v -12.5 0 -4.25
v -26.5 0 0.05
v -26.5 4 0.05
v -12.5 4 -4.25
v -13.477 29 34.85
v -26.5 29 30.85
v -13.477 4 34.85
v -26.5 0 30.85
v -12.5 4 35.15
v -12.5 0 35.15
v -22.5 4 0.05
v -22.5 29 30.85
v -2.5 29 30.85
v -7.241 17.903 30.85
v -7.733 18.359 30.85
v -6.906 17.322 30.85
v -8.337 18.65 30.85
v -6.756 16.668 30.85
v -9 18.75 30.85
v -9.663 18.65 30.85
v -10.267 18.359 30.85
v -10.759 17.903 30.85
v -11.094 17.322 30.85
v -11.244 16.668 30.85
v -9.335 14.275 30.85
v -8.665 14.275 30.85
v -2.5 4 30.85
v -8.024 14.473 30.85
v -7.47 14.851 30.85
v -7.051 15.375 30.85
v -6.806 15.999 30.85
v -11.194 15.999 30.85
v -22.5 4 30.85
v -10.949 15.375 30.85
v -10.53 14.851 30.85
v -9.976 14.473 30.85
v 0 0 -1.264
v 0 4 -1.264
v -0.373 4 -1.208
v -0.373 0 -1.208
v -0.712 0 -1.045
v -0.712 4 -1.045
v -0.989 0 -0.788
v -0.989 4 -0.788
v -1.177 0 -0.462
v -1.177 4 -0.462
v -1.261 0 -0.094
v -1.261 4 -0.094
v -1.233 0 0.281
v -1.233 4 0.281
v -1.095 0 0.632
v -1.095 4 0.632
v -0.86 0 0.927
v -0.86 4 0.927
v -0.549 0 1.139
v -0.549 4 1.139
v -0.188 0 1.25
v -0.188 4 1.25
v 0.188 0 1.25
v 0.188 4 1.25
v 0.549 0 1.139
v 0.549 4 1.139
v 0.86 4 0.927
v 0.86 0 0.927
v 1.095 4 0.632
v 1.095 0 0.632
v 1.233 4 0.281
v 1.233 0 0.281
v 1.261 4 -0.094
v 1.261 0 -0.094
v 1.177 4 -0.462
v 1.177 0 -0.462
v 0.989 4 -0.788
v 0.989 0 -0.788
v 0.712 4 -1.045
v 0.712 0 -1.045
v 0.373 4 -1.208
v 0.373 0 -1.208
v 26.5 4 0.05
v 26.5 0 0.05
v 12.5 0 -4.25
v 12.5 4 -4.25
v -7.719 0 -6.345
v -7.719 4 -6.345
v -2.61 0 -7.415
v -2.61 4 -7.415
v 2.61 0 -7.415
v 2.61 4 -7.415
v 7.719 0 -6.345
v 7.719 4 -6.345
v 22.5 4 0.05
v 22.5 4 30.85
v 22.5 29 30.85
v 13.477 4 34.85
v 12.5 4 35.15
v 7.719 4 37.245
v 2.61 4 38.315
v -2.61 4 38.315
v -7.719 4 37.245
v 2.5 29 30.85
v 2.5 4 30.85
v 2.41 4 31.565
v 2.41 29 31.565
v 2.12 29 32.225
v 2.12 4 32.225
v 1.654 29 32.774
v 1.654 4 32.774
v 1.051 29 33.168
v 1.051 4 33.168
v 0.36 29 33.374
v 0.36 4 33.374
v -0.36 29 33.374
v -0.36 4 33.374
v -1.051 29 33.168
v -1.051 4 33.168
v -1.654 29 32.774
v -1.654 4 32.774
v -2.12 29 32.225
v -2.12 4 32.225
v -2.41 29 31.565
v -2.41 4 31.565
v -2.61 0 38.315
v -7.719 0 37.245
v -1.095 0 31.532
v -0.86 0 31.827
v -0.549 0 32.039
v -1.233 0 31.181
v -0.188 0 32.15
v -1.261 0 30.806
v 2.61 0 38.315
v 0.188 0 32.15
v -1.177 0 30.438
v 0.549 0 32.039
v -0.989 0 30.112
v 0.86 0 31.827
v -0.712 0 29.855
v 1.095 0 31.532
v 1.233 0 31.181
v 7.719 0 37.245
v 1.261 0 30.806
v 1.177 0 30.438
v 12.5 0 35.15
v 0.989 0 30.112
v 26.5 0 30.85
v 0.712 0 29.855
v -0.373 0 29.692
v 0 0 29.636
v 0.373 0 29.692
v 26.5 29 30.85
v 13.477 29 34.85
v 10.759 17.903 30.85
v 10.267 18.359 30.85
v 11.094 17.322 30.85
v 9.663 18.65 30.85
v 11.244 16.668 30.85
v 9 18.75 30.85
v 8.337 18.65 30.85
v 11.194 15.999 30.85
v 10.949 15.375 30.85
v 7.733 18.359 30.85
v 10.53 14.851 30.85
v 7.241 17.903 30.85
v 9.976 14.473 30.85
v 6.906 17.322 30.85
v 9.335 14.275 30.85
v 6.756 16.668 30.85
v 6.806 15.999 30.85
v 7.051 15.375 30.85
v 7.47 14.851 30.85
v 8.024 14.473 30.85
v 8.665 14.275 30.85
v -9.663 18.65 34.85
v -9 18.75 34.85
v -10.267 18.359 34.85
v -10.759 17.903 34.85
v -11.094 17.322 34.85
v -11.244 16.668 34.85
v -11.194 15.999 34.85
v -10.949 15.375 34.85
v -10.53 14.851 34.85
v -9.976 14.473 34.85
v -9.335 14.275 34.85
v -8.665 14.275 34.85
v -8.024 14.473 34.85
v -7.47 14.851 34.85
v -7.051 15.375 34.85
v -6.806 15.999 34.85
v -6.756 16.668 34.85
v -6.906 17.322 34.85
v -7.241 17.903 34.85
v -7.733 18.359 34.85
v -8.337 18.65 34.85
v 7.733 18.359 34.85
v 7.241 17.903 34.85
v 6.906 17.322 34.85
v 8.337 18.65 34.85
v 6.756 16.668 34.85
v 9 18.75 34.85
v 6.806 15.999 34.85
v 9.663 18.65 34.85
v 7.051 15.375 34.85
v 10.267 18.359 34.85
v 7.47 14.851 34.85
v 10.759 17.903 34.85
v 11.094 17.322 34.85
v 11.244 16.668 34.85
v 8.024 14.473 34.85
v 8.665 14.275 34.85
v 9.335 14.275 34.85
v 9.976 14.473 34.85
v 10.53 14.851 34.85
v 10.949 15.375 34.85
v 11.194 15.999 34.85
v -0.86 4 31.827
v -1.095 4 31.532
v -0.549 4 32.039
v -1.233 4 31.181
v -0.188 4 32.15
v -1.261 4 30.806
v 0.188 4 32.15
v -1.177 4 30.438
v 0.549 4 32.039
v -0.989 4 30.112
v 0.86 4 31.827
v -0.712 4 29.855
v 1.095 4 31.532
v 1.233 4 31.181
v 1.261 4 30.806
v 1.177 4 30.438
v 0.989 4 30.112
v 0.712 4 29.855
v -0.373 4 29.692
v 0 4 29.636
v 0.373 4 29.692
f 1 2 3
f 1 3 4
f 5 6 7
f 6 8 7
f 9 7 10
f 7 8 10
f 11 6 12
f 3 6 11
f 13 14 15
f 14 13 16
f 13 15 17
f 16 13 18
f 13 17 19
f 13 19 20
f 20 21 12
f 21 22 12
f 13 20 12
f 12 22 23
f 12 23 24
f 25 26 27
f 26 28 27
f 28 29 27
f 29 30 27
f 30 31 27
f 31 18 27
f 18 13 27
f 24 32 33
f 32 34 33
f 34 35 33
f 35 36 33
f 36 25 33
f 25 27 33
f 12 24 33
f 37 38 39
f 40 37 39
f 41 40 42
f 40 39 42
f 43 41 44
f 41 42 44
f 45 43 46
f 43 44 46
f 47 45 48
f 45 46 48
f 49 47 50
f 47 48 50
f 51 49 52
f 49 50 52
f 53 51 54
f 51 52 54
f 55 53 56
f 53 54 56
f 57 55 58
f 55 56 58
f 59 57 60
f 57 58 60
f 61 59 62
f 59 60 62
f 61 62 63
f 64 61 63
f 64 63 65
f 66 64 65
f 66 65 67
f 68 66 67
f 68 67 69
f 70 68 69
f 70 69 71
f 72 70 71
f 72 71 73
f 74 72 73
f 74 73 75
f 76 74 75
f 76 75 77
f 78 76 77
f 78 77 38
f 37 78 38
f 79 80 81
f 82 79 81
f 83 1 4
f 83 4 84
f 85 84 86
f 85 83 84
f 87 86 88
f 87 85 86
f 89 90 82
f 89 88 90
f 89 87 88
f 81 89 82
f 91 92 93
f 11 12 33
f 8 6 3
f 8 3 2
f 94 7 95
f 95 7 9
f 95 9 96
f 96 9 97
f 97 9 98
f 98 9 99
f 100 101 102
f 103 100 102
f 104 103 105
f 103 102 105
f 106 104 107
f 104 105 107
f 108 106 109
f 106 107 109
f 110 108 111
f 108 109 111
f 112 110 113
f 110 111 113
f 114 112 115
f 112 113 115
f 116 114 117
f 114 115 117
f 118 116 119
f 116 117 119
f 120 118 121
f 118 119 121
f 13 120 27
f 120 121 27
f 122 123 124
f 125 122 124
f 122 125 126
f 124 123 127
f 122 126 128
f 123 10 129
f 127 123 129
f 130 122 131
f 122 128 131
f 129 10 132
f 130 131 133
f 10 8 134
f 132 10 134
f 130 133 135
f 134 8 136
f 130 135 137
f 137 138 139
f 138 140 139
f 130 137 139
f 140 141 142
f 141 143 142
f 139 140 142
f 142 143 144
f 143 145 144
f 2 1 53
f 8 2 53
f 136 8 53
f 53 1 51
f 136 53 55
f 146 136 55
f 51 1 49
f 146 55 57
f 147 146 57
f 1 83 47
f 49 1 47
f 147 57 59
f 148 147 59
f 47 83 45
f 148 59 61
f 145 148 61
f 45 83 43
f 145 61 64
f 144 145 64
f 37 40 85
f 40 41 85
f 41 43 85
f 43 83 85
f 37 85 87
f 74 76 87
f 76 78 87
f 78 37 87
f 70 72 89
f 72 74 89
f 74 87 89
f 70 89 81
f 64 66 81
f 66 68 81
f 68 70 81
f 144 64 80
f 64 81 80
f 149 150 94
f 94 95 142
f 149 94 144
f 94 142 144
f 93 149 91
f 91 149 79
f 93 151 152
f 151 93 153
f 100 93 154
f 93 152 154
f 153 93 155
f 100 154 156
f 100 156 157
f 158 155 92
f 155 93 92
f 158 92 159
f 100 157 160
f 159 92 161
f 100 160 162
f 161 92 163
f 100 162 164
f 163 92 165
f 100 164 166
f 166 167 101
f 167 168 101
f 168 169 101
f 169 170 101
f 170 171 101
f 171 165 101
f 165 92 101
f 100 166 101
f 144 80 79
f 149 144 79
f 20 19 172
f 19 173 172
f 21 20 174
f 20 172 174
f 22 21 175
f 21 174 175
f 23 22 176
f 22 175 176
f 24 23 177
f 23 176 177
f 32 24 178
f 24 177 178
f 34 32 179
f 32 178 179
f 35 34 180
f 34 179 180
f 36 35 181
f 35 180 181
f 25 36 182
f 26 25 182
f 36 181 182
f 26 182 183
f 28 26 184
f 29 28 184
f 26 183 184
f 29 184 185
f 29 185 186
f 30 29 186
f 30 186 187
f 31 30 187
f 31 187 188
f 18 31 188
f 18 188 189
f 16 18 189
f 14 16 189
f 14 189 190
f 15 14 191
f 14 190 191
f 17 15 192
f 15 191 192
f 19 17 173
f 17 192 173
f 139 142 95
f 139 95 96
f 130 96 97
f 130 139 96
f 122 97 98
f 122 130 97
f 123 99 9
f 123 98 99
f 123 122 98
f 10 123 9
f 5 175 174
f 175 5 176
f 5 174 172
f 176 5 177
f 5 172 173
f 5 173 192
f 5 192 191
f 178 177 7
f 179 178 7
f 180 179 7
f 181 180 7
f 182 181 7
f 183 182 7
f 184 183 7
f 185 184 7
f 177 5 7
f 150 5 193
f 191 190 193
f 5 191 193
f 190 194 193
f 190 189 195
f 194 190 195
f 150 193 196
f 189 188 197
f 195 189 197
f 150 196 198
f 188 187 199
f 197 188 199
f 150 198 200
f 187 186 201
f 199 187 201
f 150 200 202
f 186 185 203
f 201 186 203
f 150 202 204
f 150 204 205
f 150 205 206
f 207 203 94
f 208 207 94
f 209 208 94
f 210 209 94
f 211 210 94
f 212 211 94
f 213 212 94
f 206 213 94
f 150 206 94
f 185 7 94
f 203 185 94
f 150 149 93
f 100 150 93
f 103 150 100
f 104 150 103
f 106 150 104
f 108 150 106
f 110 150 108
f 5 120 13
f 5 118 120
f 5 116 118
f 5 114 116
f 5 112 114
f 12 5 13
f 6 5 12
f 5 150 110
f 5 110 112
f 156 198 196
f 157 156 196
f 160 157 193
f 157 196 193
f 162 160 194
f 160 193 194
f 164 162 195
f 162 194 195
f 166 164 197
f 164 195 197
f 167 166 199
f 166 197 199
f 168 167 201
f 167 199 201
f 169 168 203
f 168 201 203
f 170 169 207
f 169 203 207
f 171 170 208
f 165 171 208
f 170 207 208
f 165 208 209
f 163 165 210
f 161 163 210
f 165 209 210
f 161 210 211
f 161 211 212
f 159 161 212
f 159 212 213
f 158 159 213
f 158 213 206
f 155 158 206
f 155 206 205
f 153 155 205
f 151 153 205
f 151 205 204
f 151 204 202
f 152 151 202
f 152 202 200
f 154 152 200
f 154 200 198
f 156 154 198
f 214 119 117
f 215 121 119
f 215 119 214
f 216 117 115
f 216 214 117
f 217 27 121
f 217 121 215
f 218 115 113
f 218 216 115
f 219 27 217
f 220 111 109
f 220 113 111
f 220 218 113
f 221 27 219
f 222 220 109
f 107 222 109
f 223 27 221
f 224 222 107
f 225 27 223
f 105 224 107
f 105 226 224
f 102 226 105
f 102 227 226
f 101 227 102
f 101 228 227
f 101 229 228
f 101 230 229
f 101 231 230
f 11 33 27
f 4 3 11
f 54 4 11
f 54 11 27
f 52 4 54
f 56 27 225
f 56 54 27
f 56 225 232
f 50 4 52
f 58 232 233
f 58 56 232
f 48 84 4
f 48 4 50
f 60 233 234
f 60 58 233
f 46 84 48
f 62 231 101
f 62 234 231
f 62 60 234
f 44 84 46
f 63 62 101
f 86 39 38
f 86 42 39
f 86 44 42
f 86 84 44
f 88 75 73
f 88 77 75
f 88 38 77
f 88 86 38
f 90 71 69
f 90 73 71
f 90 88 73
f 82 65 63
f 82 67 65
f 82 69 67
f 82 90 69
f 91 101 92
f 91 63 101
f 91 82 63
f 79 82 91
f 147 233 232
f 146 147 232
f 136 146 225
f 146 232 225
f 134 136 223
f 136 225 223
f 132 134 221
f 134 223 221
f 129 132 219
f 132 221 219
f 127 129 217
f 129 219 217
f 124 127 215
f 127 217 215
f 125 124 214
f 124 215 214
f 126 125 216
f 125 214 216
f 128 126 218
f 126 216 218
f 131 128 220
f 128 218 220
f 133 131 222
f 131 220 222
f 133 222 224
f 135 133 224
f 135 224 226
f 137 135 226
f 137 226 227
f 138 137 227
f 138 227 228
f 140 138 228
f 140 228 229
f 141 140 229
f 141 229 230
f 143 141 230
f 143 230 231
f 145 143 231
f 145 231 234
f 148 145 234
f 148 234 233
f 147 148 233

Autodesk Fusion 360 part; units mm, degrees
sketch "Sketch1" plane through (0, 0, 0) normal (0, 1, 0) x (1, 0, 0)
  circle A0 centre (0, 0) radius 1.4
  circle A1 centre (0, -30.9) radius 1.4
  line L0 (0, -30.9) -> (0, 0) construction
  line L1 (-26.5, -15.45) -> (26.5, -15.45) construction
  line L2 (26.5, -0.05) -> (-26.5, -0.05)
  line L3 (-26.5, -0.05) -> (-26.5, -30.85)
  line L4 (-26.5, -30.85) -> (26.5, -30.85)
  line L5 (26.5, -30.85) -> (26.5, -0.05)
  line L6 (26.5, -0.05) -> (-26.5, -30.85) construction
  line L7 (-26.5, -0.05) -> (26.5, -30.85) construction
  line L8 (0, -38.45) -> (0, 7.55) construction
  line L9 (-26.5, -30.85) -> (-12.5, -35.15)
  line L10 (-12.5, -35.15) -> (0, -35.15)
  line L11 (26.5, -30.85) -> (12.5, -35.15)
  arc A2 (-12.5, -35.15) -> (12.5, -35.15) centre (0, -13.1258) ccw
  line L12 (-26.5, -0.05) -> (-12.5, 4.25)
  arc A3 (12.5, 4.25) -> (-12.5, 4.25) centre (0, -17.7742) ccw
  line L13 (26.5, -0.05) -> (12.5, 4.25)
  point P0 (0, -15.45)
  point P1 (0, -15.45)
  point P2 (0, -15.45)
  point P3 (0, -15.45)
  dimension "d1" = 2.8
  dimension "d2" = 2.8
  dimension "d3" = 30.9
  dimension "d4" = 53
  dimension "d5" = 53
  dimension "d6" = 30.8
  dimension "d7" = 14
  dimension "d8" = 19.7
  dimension "d9" = 46
extrude "Extrude1" add sketch "Sketch1" along normal blind 4
hole "Hole1" at (0, 0, 30.9) at (0, 0, 0) direction (0, 1, 0) diameter 2.529 end through all
thread "Thread1" "ISO Metric profile 3.0 M3x0.5 6H"
sketch "Sketch2" plane through (0, 4, 0) normal (0, 1, 0) x (-1, 0, 0)
  circle A0 centre (0, 30.9) radius 1.2645
  circle A1 centre (0, 0) radius 1.2645
  line L0 (-26.5, 30.85) -> (-26.5, 0.05)
  line L1 (-26.5, 0.05) -> (-12.5, -4.25)
  arc A2 (-12.5, -4.25) -> (12.5, -4.25) centre (0, 17.7742) ccw
  line L2 (12.5, -4.25) -> (26.5, 0.05)
  line L3 (26.5, 0.05) -> (26.5, 30.85)
  line L4 (26.5, 30.85) -> (12.5, 35.15)
  arc A3 (12.5, 35.15) -> (-12.5, 35.15) centre (0, 13.1258) ccw
  line L5 (-12.5, 35.15) -> (-26.5, 30.85)
  line L6 (-26.5, 30.85) -> (26.5, 30.85)
  line L7 (-26.5, 30.85) -> (26.5, 30.85)
  line L8 (26.5, 30.85) -> (26.5, 34.85)
  line L9 (26.5, 34.85) -> (-26.5, 34.85)
  line L10 (-26.5, 34.85) -> (-26.5, 30.85)
  circle A4 centre (0, 30.9) radius 2.5
  dimension "d20" = 4
  dimension "d21" = 5
extrude "Extrude2" add sketch "Sketch2" along normal blind 25 contours L4 L5 L6 L7 L9 A4
sketch "Sketch3" plane through (0, 0, 30.85) normal (0, 0, -1) x (1, 0, 0)
  line L0 (26.5, -4) -> (-26.5, -4)
  line L1 (-26.5, -4) -> (-26.5, -29)
  line L2 (-26.5, -29) -> (26.5, -29)
  line L3 (26.5, -29) -> (26.5, -4)
  line L4 (-26.5, -16.5) -> (26.5, -16.5)
  line L5 (-9, -16.5) -> (-9, -29)
  line L6 (9, -16.5) -> (9, -29)
  line L7 (26.5, -4) -> (2.4995, -4)
  line L8 (2.4995, -29) -> (26.5, -29)
  line L9 (26.5, -29) -> (26.5, -4)
  line L10 (2.4995, -4) -> (2.4995, -29)
  dimension "d18" = 17.5
  dimension "d19" = 17.5
hole "Hole2" at (-9, 16.5, 30.85) at (9, 16.5, 30.85) direction (0, 0, 1) diameter 4.5 depth 4 tip angle 118
sketch "Sketch4" plane through (-26.5, 0, 0) normal (-1, 0, 0) x (0, -1, 0)
  line L0 (0, 0.05) -> (0, 30.85)
  line L1 (0, 30.85) -> (-4, 30.85)
  line L2 (-4, 30.85) -> (-4, 0.05)
  line L3 (-4, 0.05) -> (0, 0.05)
  line L4 (0, 30.85) -> (0, 35.15)
  line L5 (0, 35.15) -> (-4, 35.15)
  line L6 (-4, 35.15) -> (-4, 34.85)
  line L7 (-4, 34.85) -> (-29, 34.85)
  line L8 (-29, 34.85) -> (-29, 30.85)
  line L9 (-29, 30.85) -> (-4, 30.85)
  line L10 (-4, 30.85) -> (0, 30.85)
  line L11 (-29, 30.85) -> (-4, 0.05)
sketch "Sketch5" plane through (26.5, 0, 0) normal (1, 0, 0) x (0, 1, 0)
  line L0 (0, 30.85) -> (0, 0.05)
  line L1 (0, 0.05) -> (4, 0.05)
  line L2 (4, 0.05) -> (4, 30.85)
  line L3 (4, 30.85) -> (0, 30.85)
  line L4 (0, 35.15) -> (0, 30.85)
  line L5 (0, 30.85) -> (4, 30.85)
  line L6 (4, 30.85) -> (29, 30.85)
  line L7 (29, 30.85) -> (29, 34.85)
  line L8 (29, 34.85) -> (4, 34.85)
  line L9 (4, 34.85) -> (4, 35.15)
  line L10 (4, 35.15) -> (0, 35.15)
  line L11 (29, 30.85) -> (4, 0.05)
extrude "Extrude3" add sketch "Sketch5" against normal blind 4 contours L2 L6 L11
extrude "Extrude4" add sketch "Sketch4" against normal blind 4 contours L2 L9 L11
equation "d8 = ( 39.4 / 2 ) * 1 mm"
